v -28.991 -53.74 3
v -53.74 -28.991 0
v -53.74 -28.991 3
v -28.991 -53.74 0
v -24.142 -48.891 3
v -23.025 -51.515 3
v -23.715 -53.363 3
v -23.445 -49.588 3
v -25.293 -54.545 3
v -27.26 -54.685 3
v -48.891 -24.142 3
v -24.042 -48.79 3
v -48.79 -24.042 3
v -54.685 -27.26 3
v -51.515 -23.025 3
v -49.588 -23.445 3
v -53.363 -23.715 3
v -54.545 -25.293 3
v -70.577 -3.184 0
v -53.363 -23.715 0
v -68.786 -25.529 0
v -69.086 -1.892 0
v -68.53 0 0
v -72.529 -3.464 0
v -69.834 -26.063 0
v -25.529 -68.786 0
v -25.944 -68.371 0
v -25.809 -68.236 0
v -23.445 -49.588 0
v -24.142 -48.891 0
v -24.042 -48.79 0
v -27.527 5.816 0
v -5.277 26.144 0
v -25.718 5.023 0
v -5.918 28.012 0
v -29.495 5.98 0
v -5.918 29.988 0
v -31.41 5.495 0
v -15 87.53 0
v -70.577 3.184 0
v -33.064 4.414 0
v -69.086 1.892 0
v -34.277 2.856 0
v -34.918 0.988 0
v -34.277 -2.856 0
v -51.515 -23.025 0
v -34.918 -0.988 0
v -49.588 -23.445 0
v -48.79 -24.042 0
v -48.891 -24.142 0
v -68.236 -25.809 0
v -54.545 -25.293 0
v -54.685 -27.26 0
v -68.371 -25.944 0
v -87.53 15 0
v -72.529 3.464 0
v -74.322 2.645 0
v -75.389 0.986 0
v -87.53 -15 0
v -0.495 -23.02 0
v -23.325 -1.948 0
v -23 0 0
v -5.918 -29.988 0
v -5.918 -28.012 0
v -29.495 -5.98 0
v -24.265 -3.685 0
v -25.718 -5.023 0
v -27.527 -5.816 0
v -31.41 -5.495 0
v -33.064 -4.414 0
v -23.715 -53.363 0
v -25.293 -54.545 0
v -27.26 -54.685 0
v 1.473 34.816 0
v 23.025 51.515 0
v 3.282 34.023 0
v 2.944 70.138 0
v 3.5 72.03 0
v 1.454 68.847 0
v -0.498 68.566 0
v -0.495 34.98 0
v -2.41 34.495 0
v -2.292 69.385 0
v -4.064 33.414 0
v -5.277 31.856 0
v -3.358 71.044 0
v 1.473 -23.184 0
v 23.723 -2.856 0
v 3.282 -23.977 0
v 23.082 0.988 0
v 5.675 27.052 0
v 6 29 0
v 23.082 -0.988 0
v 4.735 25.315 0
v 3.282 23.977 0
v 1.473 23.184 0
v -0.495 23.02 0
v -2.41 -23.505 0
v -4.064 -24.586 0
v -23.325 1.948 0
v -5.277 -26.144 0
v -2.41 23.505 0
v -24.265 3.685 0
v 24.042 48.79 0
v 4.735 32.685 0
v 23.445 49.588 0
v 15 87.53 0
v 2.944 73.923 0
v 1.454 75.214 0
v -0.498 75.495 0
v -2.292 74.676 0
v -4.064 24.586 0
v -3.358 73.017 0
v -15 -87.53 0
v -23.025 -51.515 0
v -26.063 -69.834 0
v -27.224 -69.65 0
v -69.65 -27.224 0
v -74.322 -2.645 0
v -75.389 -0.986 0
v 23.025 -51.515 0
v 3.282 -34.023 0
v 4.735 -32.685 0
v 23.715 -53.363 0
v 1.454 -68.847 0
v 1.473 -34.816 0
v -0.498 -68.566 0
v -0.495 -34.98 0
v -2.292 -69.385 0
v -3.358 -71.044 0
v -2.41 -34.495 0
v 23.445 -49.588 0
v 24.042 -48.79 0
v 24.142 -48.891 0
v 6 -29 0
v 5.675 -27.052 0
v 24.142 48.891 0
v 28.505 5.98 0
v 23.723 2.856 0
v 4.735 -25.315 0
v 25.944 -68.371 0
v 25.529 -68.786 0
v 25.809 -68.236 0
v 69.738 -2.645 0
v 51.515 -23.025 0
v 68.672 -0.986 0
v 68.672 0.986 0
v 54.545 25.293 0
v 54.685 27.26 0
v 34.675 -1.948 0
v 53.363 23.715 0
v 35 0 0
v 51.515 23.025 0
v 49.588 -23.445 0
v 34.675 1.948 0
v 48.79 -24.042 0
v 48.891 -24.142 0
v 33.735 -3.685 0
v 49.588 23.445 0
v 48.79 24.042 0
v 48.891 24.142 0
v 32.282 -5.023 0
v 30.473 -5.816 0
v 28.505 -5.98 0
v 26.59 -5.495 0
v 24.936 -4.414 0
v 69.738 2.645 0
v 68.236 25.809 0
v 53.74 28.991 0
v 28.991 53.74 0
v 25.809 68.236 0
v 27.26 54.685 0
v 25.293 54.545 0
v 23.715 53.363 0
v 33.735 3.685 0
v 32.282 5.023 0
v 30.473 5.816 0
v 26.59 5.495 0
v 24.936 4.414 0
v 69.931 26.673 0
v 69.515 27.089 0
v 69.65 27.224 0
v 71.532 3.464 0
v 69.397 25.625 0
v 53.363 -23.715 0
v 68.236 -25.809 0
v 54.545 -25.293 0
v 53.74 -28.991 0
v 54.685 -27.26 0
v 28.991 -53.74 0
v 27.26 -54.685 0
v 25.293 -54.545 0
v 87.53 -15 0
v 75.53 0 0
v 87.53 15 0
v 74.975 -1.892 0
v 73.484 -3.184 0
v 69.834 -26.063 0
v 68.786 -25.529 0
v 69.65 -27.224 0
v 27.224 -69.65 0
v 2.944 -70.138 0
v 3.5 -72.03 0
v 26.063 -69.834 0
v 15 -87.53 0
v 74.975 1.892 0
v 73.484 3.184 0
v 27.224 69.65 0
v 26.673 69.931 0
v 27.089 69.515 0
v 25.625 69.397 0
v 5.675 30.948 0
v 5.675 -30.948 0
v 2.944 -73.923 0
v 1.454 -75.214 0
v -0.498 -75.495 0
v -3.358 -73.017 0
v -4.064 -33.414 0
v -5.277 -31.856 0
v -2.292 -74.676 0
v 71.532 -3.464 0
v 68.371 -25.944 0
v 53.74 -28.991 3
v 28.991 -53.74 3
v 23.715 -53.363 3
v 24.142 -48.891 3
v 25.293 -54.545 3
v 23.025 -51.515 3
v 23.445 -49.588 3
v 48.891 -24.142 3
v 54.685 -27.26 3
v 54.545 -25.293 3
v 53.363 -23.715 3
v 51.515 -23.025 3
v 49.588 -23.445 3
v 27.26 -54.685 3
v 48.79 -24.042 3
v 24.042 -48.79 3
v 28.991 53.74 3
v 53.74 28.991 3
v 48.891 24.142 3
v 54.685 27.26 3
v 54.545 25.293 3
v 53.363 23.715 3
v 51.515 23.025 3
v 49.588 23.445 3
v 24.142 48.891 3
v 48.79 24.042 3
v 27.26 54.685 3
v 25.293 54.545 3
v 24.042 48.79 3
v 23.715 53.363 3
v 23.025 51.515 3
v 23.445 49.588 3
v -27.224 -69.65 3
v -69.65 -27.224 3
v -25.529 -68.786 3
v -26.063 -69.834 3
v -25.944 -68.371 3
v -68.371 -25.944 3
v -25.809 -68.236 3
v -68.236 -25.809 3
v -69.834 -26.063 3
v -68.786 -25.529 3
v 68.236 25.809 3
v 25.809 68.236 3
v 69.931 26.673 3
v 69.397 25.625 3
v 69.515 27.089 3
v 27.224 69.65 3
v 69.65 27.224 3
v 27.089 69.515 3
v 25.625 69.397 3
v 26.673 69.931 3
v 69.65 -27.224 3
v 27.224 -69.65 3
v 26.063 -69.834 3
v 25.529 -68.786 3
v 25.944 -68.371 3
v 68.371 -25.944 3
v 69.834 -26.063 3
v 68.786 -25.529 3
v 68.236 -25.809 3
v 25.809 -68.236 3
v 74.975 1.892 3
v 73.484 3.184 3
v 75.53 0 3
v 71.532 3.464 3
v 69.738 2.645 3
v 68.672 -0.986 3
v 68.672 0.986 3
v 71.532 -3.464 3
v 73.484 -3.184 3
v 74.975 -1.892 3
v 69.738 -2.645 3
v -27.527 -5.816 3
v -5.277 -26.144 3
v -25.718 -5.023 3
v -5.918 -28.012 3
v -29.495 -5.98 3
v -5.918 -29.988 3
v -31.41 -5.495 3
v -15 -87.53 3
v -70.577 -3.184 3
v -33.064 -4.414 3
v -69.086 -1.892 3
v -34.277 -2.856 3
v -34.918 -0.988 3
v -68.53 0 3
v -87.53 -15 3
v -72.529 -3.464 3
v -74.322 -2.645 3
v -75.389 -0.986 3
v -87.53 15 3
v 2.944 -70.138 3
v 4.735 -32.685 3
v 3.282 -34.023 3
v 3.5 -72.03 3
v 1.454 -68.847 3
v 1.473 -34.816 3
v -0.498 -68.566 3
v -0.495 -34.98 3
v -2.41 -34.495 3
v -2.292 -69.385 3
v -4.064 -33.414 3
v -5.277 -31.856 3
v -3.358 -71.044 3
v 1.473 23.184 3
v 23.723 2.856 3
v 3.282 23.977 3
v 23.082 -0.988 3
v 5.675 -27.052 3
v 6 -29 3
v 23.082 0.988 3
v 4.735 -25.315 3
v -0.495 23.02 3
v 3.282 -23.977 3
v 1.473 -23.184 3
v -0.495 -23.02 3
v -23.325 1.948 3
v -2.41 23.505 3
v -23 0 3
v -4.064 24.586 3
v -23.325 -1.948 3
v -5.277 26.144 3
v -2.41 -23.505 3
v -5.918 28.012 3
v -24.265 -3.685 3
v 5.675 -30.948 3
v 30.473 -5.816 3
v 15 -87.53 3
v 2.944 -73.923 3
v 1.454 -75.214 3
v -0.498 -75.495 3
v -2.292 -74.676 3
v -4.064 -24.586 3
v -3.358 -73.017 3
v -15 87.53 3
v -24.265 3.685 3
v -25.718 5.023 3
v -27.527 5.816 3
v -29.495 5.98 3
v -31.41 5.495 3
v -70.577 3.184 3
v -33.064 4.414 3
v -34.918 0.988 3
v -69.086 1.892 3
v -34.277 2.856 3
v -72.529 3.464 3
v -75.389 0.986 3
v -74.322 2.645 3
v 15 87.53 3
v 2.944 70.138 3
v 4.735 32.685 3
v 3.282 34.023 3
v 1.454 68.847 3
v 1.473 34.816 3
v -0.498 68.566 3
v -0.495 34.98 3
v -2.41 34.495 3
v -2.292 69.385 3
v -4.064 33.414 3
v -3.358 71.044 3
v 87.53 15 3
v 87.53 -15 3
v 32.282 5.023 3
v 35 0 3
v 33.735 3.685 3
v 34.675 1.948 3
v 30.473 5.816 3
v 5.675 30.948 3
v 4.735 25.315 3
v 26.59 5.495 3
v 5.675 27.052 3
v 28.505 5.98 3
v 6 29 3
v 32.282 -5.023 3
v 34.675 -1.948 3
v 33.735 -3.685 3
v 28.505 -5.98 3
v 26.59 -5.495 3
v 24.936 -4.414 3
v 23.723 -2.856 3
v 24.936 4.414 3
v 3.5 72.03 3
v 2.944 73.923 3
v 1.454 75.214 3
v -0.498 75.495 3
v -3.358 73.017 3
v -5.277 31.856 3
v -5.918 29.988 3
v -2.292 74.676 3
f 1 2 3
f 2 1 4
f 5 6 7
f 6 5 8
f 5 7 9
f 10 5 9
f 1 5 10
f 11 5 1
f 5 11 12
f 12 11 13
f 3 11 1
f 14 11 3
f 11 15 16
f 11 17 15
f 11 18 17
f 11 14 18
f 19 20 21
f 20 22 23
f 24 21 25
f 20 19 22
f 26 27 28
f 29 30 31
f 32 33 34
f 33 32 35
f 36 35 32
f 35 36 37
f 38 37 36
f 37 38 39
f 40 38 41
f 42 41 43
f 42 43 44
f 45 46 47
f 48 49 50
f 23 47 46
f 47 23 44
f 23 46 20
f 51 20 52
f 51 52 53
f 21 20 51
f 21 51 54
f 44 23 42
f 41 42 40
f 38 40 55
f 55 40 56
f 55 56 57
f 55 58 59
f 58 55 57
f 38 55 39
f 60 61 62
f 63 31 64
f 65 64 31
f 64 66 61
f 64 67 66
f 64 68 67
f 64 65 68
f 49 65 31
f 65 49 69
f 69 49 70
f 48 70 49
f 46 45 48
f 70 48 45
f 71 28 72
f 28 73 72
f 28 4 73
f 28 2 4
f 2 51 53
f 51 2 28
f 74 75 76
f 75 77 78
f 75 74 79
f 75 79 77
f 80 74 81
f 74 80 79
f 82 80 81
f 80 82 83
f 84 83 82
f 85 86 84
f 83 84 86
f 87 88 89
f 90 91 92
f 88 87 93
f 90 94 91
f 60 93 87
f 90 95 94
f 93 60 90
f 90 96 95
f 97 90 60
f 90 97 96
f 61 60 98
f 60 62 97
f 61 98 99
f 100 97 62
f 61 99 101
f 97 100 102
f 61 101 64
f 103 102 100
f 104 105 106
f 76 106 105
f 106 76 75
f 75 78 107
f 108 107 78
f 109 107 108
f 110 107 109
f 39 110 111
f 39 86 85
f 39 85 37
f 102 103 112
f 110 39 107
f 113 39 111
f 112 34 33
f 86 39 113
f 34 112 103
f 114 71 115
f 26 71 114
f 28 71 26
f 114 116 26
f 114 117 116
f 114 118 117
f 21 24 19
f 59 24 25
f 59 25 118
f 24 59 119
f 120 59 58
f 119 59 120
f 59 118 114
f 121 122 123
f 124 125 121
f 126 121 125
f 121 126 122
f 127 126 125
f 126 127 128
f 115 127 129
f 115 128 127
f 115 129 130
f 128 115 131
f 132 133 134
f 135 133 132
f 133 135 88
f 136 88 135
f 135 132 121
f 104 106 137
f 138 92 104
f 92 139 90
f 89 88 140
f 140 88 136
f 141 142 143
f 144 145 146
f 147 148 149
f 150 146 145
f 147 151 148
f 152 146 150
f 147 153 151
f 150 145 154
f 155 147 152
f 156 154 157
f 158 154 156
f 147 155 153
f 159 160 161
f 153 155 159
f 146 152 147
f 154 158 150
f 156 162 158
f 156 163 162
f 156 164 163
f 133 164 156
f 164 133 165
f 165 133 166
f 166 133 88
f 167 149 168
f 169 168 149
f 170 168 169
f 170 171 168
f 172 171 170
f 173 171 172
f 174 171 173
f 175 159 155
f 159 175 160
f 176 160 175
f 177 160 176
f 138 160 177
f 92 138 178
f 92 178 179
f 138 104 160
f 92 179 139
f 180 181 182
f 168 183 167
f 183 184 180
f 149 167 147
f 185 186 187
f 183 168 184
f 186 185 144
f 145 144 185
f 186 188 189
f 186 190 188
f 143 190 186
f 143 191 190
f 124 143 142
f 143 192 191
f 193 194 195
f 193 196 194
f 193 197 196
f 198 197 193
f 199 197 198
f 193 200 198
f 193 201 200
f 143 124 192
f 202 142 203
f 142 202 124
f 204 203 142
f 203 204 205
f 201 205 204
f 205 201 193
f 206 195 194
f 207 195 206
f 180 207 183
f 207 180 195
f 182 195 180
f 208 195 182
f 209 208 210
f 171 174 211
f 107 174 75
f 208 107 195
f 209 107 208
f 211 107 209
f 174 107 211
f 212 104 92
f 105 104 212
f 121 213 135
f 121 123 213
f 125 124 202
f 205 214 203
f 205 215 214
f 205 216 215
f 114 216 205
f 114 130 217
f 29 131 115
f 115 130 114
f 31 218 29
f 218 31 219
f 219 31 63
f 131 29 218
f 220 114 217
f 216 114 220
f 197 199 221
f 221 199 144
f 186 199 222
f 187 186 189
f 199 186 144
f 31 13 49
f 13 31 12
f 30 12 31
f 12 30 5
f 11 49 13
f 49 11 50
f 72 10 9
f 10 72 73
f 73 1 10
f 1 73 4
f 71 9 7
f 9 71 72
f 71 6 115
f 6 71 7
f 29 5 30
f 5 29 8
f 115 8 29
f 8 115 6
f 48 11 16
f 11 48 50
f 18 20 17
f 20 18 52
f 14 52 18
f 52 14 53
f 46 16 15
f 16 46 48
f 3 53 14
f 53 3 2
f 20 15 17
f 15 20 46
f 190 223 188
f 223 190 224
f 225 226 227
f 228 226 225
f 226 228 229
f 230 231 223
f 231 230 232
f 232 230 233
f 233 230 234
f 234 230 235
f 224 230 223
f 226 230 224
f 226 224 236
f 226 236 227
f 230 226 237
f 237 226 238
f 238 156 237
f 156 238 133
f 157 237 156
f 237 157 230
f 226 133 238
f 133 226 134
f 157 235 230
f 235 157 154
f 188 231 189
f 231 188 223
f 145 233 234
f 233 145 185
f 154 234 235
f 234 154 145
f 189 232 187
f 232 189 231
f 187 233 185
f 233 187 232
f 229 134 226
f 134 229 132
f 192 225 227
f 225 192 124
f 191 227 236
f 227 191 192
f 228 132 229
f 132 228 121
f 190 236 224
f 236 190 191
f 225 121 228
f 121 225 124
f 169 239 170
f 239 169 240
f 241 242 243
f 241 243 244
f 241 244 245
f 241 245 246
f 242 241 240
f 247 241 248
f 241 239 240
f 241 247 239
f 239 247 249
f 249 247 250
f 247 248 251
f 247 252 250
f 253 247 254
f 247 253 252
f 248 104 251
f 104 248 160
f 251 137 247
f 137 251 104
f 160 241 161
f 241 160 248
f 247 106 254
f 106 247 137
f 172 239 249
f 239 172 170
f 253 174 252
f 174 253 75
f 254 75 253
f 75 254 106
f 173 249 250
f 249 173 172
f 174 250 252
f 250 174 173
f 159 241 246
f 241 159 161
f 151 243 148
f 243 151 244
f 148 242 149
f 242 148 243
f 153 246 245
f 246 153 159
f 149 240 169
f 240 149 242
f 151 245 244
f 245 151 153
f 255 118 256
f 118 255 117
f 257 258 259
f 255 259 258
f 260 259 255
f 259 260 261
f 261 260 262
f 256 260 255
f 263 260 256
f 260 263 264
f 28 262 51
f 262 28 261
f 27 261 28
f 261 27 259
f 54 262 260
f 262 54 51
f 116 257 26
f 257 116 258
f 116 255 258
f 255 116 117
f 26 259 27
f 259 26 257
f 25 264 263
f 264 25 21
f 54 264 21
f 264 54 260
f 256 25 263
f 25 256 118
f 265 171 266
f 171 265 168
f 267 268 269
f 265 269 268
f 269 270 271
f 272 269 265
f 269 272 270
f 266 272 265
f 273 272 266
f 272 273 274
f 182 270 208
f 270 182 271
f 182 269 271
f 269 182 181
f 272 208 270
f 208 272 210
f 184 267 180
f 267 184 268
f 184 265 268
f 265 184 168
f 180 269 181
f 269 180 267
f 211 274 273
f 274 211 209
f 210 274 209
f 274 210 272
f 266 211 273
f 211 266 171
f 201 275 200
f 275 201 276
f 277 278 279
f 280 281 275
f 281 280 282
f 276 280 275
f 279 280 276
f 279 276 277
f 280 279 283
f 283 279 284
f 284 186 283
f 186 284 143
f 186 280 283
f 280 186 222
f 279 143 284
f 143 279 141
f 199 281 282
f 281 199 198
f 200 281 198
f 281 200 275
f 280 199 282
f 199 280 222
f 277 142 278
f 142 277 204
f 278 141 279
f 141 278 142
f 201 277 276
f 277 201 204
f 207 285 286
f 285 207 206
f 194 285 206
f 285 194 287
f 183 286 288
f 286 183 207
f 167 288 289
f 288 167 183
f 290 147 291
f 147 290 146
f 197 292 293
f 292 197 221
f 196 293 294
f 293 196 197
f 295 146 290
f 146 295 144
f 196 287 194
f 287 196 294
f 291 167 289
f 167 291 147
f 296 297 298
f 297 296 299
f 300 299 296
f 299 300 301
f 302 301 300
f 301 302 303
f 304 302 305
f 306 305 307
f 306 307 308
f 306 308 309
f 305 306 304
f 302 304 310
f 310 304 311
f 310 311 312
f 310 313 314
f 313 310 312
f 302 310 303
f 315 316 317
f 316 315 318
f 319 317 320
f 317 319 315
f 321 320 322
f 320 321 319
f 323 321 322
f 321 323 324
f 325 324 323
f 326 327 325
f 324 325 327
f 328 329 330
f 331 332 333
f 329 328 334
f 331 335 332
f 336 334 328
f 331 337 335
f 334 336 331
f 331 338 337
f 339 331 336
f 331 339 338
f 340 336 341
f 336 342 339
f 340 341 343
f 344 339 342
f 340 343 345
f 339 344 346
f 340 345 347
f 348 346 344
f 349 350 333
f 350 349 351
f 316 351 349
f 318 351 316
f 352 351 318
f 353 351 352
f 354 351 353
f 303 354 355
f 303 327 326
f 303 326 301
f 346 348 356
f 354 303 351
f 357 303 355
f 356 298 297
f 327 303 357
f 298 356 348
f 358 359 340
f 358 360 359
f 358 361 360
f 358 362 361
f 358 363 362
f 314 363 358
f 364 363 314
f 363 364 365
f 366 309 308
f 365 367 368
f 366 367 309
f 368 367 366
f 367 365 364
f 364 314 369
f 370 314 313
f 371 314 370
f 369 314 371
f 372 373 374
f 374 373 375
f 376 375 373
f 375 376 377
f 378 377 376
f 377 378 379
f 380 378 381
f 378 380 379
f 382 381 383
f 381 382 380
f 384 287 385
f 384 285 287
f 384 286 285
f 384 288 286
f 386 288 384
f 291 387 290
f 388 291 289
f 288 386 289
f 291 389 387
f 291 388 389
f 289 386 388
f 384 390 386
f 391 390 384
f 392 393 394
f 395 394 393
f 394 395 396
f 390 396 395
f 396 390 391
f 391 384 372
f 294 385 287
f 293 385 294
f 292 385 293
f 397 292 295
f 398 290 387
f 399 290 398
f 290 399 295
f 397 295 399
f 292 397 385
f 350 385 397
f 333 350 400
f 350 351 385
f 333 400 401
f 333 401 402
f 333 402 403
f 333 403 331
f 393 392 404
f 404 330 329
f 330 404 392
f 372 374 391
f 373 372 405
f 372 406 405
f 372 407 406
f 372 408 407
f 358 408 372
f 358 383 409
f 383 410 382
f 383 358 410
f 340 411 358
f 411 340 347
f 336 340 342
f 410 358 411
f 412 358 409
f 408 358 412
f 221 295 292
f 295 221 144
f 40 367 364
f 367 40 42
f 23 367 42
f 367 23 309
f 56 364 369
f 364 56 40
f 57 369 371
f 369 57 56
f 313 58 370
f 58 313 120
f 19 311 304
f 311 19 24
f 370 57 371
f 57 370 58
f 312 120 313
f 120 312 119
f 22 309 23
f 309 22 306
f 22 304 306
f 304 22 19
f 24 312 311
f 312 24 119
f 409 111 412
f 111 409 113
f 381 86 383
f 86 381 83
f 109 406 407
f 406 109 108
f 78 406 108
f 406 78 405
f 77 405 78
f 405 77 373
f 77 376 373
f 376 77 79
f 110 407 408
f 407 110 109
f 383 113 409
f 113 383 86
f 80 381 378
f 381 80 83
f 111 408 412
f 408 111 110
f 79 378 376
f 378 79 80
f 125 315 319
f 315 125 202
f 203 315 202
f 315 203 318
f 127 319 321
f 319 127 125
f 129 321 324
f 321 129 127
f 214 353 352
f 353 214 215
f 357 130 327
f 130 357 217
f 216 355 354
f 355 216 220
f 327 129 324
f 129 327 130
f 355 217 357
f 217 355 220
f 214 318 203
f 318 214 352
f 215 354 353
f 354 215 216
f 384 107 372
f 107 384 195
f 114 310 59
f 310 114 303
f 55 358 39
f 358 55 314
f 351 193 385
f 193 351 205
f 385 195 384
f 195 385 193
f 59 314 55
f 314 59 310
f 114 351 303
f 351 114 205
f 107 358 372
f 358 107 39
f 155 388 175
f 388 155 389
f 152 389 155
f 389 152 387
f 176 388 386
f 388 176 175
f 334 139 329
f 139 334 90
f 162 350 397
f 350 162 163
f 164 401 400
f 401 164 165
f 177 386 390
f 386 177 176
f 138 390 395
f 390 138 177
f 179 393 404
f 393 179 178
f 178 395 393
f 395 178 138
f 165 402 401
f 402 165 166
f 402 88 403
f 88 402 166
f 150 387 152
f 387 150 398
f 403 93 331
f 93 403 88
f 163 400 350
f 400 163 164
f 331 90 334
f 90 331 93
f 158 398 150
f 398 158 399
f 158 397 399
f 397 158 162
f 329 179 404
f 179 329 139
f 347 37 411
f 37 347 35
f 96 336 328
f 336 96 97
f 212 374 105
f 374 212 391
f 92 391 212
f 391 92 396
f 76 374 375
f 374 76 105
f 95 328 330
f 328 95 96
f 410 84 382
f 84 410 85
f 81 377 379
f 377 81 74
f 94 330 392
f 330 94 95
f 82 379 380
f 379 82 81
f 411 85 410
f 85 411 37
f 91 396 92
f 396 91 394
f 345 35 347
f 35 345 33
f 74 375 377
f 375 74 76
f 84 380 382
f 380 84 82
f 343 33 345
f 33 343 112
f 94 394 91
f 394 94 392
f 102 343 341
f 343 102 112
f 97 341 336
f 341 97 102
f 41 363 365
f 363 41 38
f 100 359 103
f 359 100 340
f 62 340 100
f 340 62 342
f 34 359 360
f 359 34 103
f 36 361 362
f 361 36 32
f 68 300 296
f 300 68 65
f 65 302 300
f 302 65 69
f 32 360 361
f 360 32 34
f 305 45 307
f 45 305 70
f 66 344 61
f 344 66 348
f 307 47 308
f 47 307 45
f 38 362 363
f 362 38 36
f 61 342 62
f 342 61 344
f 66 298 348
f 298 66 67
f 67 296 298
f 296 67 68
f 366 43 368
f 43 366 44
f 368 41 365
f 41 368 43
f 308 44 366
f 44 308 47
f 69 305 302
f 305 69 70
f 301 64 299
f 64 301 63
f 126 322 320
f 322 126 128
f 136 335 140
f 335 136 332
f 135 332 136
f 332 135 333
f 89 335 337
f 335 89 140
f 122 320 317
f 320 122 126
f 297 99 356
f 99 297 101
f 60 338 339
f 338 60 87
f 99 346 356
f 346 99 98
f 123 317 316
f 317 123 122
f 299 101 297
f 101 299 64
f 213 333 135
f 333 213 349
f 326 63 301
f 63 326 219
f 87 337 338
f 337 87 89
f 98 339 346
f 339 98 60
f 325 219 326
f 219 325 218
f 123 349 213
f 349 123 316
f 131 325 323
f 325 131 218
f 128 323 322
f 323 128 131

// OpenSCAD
// file: common.scad
module M25Hole(x, y, z, depth) {
    translate([x, y, z]) {
        cylinder(h = depth, d = 2.5, center = true);
    }
}

module M6Hole(x, y, z, depth) {
    translate([x, y, z]) {
        cylinder(h = depth, d = 7.0, center = true);
    }
}

module Plate(plate_width, plate_depth) {
  difference() {
    // plate
    rotate(45) {
      translate([-plate_width / 2.0, -plate_width / 2.0, 0.0]) {
        cube([plate_width, plate_width, plate_depth]);
      }
    }

    // square cut plate corners
    A = plate_width;
    B = sqrt(2 * pow(A, 2));
    C = 30.0;
    D = 30.0;

    translate([B / 2.0, 0.0, plate_depth / 2.0]) {
      cube([C, D, plate_depth], true);
    }
    translate([-B / 2.0, 0.0, plate_depth / 2.0]) {
      cube([C, D, plate_depth], true);
    }
    translate([0.0, -B / 2.0, plate_depth / 2.0]) {
      cube([D, C, plate_depth], true);
    }
    translate([0.0, B/ 2.0, plate_depth / 2.0]) {
      cube([D, C, plate_depth], true);
    }

    // holes
    rotate(-135) {
      CableRoutingHoles(plate_width, plate_depth);
      CableFasteningHoles(plate_width, plate_depth);
    }
    ArmScrewHoles(plate_width, plate_depth, B - C);
    StackHoles(plate_width, plate_depth, B - C);
  }
}

module OdroidXU4MountHoles(plate_depth) {
    depth = 76;
    width = 52;

    rotate(45) {
        M25Hole(depth / 2.0, width / 2.0, 0.0, plate_depth * 2);
        M25Hole(-depth / 2.0, width / 2.0, 0.0, plate_depth * 2);
        M25Hole(depth / 2.0, -width / 2.0, 0.0, plate_depth * 2);
        M25Hole(-depth / 2.0, -width / 2.0, 0.0, plate_depth * 2);
    }
}

module StackHoles(plate_width, plate_depth, plate_diagonal) {
    between_line = 20.0;

    E = 5.5;
    F = (plate_diagonal / 2.0) - E;
    H = F - (between_line / 2.0);

    M6Hole(H, 0.0, plate_depth / 2.0, plate_depth);
    M6Hole(-H, 0.0, plate_depth / 2.0, plate_depth);
    M6Hole(0.0, H, plate_depth / 2.0, plate_depth);
    M6Hole(0.0, -H, plate_depth / 2.0, plate_depth);
}

module CableFasteningHoles(plate_width, plate_depth) {
  inner_width = plate_width - 10.0;
  hole_width = 60;
  hole_length = 2;

  translate([inner_width / 2.0, 0.0, plate_depth / 2.0]) {
    cube(size=[hole_length, hole_width, plate_depth], center=true);
    translate([0.0, hole_width / 2.0, -plate_depth / 2.0]) {
      cylinder(r=hole_length / 2.0, h=plate_depth, center=false);
    }
    translate([0.0, -hole_width / 2.0, -plate_depth / 2.0]) {
      cylinder(r=hole_length / 2.0, h=plate_depth, center=false);
    }
  }

  translate([-inner_width / 2.0, 0.0, plate_depth / 2.0]) {
    cube(size=[hole_length, hole_width, plate_depth], center=true);
    translate([0.0, hole_width / 2.0, -plate_depth / 2.0]) {
      cylinder(r=hole_length / 2.0, h=plate_depth, center=false);
    }
    translate([0.0, -hole_width / 2.0, -plate_depth / 2.0]) {
      cylinder(r=hole_length / 2.0, h=plate_depth, center=false);
    }
  }

  rotate(90) translate([inner_width / 2.0, 0.0, plate_depth / 2.0]) {
    cube(size=[hole_length, hole_width, plate_depth], center=true);
    translate([0.0, hole_width / 2.0, -plate_depth / 2.0]) {
      cylinder(r=hole_length / 2.0, h=plate_depth, center=false);
    }
    translate([0.0, -hole_width / 2.0, -plate_depth / 2.0]) {
      cylinder(r=hole_length / 2.0, h=plate_depth, center=false);
    }
  }
}

module CableRoutingHoles(plate_width, plate_depth) {
  routing_width = plate_width - 35.0;
  hole_width = 35;
  hole_length = 7;

  // inner cable fastening holes
  translate([routing_width / 2.0, 0.0, plate_depth / 2.0]) {
    cube(size=[hole_length, hole_width, plate_depth], center=true);
    translate([0.0, hole_width / 2.0, -plate_depth / 2.0]) {
      cylinder(r=hole_length / 2.0, h=plate_depth, center=false);
    }
    translate([0.0, -hole_width / 2.0, -plate_depth / 2.0]) {
      cylinder(r=hole_length / 2.0, h=plate_depth, center=false);
    }
  }

  rotate(90) translate([routing_width / 2.0, 0.0, plate_depth / 2.0]) {
    cube(size=[hole_length, hole_width, plate_depth], center=true);
    translate([0.0, hole_width / 2.0, -plate_depth / 2.0]) {
      cylinder(r=hole_length / 2.0, h=plate_depth, center=false);
    }
    translate([0.0, -hole_width / 2.0, -plate_depth / 2.0]) {
      cylinder(r=hole_length / 2.0, h=plate_depth, center=false);
    }
  }

  rotate(180) translate([routing_width / 2.0, 0.0, plate_depth / 2.0]) {
    cube(size=[hole_length, hole_width, plate_depth], center=true);
    translate([0.0, hole_width / 2.0, -plate_depth / 2.0]) {
      cylinder(r=hole_length / 2.0, h=plate_depth, center=false);
    }
    translate([0.0, -hole_width / 2.0, -plate_depth / 2.0]) {
      cylinder(r=hole_length / 2.0, h=plate_depth, center=false);
    }
  }
}

module BatteryStrapHoles(plate_width, plate_depth) {
  hole_width = 5;
  hole_length = 25;
  hole_between_width = 45;

  rotate(45) {
    translate([hole_between_width / 2.0, 0.0, plate_depth / 2.0]) {
      cube([hole_width, hole_length, plate_depth], center = true);
      translate([0.0, hole_length / 2.0, -plate_depth / 2.0]) {
        cylinder(r=hole_width / 2.0, h=plate_depth, center=false);
      }
      translate([0.0, -hole_length / 2.0, -plate_depth / 2.0]) {
        cylinder(r=hole_width / 2.0, h=plate_depth, center=false);
      }
    }
  }

  rotate(45) {
    translate([-hole_between_width / 2.0, 0.0, plate_depth / 2.0]) {
      cube([hole_width, hole_length, plate_depth], center = true);
      translate([0.0, hole_length / 2.0, -plate_depth / 2.0]) {
        cylinder(r=hole_width / 2.0, h=plate_depth, center=false);
      }
      translate([0.0, -hole_length / 2.0, -plate_depth / 2.0]) {
        cylinder(r=hole_width / 2.0, h=plate_depth, center=false);
      }
    }
  }
}

module LowerArmScrewHoles(plate_width, plate_depth, plate_diagonal) {
  base_line = 21.0;
  between_line = 20.0;

  E = 5.5;
  F = (plate_diagonal / 2.0) - E;
  G = F - between_line;

  // outer screw holes
  M25Hole(F, -base_line / 2.0, plate_depth / 2.0, plate_depth);
  M25Hole(F, base_line / 2.0, plate_depth / 2.0, plate_depth);

  M25Hole(-F, -base_line / 2.0, plate_depth / 2.0, plate_depth);
  M25Hole(-F, base_line / 2.0, plate_depth / 2.0, plate_depth);

  M25Hole(-base_line / 2.0, F, plate_depth / 2.0, plate_depth);
  M25Hole(base_line / 2.0, F, plate_depth / 2.0, plate_depth);

  M25Hole(-base_line / 2.0, -F, plate_depth / 2.0, plate_depth);
  M25Hole(base_line / 2.0, -F, plate_depth / 2.0, plate_depth);
}
// main file
use <common.scad>

// plate parameters
plate_width = 145.0;
plate_depth = 3.0;

module BasePlate(plate_width, plate_depth) {
  difference() {
    // plate
    rotate(45) {
      translate([-plate_width / 2.0, -plate_width / 2.0, 0.0]) {
        cube([plate_width, plate_width, plate_depth]);
      }
    }

    // square cut plate corners
    A = plate_width;
    B = sqrt(2 * pow(A, 2));
    C = 30.0;
    D = 30.0;

    translate([B / 2.0, 0.0, plate_depth / 2.0]) {
      cube([C, D, plate_depth], true);
    }
    translate([-B / 2.0, 0.0, plate_depth / 2.0]) {
      cube([C, D, plate_depth], true);
    }
    translate([0.0, -B / 2.0, plate_depth / 2.0]) {
      cube([D, C, plate_depth], true);
    }
    translate([0.0, B/ 2.0, plate_depth / 2.0]) {
      cube([D, C, plate_depth], true);
    }

    translate([plate_width * 0.2, 0.0, plate_depth / 2.0]) {
      cylinder(r=6, plate_depth, center=true);
    }
    translate([0.0, plate_width * 0.2, plate_depth / 2.0]) {
      cylinder(r=6, plate_depth, center=true);
    }
    translate([-plate_width * 0.2, 0.0, plate_depth / 2.0]) {
      cylinder(r=6, plate_depth, center=true);
    }
    translate([0.0, -plate_width * 0.2, plate_depth / 2.0]) {
      cylinder(r=6, plate_depth, center=true);
    }

    // holes
    rotate(-135) {
      CableRoutingHoles(plate_width, plate_depth);
      CableFasteningHoles(plate_width, plate_depth);
    }
    StackHoles(plate_width, plate_depth, B - C);
  }
}

BasePlate(plate_width, plate_depth);
